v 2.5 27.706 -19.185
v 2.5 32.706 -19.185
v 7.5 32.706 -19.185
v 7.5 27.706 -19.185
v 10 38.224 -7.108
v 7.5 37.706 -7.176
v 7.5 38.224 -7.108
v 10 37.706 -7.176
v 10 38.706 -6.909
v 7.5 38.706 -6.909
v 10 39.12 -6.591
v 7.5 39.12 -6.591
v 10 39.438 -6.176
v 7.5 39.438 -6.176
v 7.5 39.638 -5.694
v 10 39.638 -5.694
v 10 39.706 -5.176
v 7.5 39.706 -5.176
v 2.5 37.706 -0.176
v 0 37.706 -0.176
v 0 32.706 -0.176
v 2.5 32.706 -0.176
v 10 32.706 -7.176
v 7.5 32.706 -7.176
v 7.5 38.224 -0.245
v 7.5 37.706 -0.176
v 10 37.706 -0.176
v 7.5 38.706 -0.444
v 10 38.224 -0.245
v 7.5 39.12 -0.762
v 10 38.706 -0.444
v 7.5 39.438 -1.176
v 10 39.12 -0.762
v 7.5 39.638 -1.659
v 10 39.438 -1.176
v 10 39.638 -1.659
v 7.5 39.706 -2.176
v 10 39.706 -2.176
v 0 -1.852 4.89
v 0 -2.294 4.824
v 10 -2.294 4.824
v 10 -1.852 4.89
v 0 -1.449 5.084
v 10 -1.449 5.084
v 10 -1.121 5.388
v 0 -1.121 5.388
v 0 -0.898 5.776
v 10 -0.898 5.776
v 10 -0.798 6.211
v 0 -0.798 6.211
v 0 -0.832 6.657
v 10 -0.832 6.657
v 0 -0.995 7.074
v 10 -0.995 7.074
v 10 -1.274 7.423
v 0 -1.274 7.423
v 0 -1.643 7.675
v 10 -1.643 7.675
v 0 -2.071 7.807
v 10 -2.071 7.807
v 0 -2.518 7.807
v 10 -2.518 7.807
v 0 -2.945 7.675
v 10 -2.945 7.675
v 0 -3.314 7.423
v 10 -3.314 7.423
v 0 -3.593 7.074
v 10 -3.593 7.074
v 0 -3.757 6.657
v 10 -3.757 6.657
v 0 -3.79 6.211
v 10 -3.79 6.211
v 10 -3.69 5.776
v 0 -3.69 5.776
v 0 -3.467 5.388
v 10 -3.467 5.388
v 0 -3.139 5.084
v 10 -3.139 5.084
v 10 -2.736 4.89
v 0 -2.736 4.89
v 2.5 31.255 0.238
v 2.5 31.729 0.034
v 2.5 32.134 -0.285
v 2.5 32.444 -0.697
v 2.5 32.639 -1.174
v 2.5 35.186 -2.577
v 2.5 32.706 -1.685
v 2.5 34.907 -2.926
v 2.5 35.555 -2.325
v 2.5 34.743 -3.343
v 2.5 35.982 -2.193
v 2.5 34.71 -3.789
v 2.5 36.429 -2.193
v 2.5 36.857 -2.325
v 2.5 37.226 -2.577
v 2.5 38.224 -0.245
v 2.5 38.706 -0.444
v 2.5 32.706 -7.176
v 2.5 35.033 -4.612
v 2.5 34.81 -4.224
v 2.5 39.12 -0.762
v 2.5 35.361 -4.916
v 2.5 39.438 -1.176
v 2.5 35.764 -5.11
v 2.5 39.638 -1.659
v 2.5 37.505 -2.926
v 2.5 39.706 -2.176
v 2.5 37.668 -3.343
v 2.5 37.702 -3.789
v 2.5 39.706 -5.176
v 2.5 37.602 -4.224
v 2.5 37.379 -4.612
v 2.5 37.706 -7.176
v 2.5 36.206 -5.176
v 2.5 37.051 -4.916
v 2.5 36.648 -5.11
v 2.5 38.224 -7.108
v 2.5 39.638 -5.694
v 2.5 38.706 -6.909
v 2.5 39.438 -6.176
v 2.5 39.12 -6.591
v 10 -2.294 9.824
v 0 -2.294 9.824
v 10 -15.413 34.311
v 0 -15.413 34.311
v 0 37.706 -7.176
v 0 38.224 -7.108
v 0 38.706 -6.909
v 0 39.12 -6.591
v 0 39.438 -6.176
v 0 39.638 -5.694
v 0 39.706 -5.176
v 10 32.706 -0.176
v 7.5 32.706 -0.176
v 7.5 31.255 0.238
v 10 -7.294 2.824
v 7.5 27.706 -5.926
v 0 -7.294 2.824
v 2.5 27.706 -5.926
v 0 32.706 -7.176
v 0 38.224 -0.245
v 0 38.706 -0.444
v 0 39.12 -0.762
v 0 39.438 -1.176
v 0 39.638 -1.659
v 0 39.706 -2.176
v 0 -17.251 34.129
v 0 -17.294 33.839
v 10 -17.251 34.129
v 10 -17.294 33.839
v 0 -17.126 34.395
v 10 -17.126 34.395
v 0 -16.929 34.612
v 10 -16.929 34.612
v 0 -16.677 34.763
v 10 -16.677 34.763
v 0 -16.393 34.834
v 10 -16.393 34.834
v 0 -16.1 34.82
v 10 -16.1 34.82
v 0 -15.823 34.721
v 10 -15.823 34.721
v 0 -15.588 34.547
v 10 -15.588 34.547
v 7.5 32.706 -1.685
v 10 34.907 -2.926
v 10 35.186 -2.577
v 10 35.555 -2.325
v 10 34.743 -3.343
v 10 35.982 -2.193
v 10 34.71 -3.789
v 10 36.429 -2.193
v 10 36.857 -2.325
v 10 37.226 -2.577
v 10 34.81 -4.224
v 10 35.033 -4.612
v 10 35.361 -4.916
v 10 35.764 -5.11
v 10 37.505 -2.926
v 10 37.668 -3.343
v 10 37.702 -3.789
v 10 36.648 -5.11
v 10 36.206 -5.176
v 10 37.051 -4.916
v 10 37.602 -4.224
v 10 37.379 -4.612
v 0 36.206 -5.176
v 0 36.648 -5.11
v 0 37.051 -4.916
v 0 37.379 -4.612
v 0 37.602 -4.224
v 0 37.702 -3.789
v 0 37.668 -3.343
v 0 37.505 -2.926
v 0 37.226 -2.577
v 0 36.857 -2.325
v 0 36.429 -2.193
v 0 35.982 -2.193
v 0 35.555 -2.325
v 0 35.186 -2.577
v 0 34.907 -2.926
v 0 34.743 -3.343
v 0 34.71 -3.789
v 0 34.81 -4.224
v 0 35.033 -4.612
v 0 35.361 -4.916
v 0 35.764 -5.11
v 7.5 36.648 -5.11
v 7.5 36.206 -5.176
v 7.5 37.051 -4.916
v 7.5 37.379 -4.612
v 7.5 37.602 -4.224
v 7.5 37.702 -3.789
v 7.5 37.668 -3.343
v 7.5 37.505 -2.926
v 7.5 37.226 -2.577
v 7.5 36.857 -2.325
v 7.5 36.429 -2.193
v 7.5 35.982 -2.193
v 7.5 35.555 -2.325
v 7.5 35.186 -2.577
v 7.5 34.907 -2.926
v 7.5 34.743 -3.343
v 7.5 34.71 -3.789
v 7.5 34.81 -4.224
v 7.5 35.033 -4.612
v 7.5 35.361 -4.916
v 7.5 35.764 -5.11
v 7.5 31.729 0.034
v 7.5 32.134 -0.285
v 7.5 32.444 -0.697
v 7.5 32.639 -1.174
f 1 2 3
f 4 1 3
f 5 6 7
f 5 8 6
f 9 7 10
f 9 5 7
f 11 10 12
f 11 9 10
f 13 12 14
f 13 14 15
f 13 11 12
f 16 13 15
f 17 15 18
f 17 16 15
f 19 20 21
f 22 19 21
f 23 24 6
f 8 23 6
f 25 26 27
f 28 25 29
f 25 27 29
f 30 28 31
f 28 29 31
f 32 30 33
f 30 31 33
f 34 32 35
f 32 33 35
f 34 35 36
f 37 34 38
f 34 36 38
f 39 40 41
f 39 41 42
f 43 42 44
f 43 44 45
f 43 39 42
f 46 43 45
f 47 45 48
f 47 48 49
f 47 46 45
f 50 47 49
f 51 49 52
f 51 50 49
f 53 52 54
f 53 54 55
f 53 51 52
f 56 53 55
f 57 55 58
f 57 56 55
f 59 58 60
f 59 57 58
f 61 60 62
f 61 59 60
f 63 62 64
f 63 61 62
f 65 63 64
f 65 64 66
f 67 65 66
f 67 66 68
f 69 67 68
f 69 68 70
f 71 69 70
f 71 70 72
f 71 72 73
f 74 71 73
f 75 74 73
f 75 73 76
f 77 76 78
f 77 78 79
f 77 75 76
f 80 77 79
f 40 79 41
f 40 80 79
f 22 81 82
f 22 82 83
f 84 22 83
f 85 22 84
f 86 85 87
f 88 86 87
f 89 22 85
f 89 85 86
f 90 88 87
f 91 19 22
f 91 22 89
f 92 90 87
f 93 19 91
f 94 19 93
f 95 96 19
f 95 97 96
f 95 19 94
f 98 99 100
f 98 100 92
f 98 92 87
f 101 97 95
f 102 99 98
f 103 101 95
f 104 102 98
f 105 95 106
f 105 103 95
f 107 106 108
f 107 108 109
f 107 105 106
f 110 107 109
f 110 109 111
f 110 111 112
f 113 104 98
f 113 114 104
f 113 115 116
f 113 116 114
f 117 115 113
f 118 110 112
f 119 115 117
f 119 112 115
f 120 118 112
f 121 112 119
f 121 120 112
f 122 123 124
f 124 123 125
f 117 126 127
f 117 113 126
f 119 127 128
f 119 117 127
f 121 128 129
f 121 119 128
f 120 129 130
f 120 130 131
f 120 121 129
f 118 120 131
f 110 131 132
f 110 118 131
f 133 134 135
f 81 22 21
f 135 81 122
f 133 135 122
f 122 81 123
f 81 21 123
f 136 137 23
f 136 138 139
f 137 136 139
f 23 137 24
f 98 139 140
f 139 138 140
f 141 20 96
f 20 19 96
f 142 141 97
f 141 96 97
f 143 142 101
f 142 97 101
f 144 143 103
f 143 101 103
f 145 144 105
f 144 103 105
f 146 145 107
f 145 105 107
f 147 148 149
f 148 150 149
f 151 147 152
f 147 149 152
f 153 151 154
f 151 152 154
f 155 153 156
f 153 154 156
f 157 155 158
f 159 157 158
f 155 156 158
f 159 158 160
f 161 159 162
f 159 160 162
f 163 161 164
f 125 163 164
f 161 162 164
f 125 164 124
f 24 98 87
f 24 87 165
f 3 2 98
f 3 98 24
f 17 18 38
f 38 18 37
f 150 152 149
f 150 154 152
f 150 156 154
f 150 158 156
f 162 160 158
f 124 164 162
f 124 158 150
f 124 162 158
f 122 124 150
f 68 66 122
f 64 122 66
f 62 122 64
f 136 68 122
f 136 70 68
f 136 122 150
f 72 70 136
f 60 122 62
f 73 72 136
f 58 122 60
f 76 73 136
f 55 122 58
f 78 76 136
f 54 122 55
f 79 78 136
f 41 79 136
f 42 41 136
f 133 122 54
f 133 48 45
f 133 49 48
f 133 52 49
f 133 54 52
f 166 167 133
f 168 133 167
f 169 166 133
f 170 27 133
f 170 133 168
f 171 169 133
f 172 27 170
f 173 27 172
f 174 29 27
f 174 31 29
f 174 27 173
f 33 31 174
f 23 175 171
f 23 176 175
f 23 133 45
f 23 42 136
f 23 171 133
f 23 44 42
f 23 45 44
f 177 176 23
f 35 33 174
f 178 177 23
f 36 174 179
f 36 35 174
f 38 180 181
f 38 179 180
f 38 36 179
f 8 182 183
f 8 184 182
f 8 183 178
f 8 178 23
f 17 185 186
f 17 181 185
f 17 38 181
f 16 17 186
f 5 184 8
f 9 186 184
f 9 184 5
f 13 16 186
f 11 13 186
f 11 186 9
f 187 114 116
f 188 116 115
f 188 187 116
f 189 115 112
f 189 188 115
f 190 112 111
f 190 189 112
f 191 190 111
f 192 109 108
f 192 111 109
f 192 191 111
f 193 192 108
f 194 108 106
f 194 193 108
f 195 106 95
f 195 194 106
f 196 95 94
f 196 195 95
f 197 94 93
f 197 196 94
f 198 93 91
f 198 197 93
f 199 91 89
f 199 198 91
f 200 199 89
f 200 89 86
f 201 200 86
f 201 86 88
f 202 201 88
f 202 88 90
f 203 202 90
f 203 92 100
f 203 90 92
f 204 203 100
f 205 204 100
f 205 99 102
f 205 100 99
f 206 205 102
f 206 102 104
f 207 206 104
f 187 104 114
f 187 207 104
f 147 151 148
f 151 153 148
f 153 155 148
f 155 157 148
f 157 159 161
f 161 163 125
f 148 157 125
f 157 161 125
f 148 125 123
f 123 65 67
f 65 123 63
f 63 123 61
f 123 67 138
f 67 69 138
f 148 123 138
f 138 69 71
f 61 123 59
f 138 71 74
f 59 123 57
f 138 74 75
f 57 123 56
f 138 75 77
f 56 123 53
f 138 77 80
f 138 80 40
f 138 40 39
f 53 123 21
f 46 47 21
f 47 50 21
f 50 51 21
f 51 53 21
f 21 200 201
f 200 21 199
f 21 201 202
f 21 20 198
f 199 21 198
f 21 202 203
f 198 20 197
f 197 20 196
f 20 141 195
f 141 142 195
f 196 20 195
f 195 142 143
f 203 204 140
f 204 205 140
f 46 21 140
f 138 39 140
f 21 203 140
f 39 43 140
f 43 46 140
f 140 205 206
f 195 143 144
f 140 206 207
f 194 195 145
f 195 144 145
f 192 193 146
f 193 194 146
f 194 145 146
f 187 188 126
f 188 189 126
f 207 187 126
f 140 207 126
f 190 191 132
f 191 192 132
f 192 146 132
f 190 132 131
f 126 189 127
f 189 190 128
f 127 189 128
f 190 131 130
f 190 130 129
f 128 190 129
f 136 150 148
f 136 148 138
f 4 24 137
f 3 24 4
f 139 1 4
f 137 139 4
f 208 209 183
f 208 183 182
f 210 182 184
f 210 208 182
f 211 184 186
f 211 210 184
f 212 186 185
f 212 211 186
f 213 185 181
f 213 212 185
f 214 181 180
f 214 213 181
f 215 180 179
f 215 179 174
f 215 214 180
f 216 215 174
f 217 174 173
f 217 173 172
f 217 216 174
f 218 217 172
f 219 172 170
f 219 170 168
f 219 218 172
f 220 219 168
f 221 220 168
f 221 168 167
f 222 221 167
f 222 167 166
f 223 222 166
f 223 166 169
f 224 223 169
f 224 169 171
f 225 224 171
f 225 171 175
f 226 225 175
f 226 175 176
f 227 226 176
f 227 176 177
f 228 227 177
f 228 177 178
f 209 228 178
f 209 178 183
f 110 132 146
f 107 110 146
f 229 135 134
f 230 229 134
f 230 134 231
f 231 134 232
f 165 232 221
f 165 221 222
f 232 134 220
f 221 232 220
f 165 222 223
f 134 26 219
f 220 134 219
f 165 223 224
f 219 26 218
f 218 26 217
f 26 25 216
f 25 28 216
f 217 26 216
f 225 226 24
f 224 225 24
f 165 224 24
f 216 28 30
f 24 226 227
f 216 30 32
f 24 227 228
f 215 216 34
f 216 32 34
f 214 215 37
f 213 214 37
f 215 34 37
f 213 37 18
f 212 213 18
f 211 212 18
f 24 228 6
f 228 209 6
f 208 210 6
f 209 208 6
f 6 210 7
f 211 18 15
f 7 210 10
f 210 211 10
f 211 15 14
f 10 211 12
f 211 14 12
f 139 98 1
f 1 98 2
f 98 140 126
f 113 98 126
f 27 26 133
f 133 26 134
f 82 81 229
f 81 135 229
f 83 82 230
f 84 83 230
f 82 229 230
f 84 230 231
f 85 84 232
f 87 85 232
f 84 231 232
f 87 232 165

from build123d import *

# Parameters (mm, degrees)
SKETCH1_R           = 1.5
BOSS_EXTRUDE1_DEPTH = 10
FILLET1_R           = 1
SKETCH2_W           = 5
SKETCH2_H           = 7
CUT_EXTRUDE1_DEPTH  = 7
FILLET3_R           = 2
CUT_EXTRUDE2_DEPTH  = 20
SKETCH4_W           = 5
SKETCH4_H           = 17.5
BOSS_EXTRUDE3_DEPTH = 5


with BuildPart() as part:
    # Sketch1 → Boss-Extrude1 (new body)
    with BuildSketch(Plane(origin=(0, 0, 0), x_dir=(0, 0, -1), z_dir=(1, 0, 0))):
        Polygon((-37.823529412, -17.294117647), (-22.823529412, -17.294117647), (-2.823529412, -7.294117647), (7.176470588, 32.705882353), (7.176470588, 39.705882353), (0.176470588, 39.705882353), (0.176470588, 32.705882353), (-9.823529412, -2.294117647), align=None)
        with Locations((3.676470588, 36.205882353)):
            Circle(SKETCH1_R, mode=Mode.SUBTRACT)
        with Locations((-6.323529412, -2.294117647)):
            Circle(SKETCH1_R, mode=Mode.SUBTRACT)
    extrude(amount=BOSS_EXTRUDE1_DEPTH)

    # Fillet1
    fillet1_edges = [part.edges().sort_by_distance(p)[0] for p in [
        (5, -17.294117647, 37.823529412),
    ]]
    fillet(fillet1_edges, radius=FILLET1_R)

    # Sketch2 → Cut-Extrude1 (cut)
    with BuildSketch(Plane(origin=(0, 39.705882353, 0), x_dir=(1, 0, 0), z_dir=(0, 1, 0))):
        with Locations((5, 3.676470588)):
            Rectangle(SKETCH2_W, SKETCH2_H)
    extrude(amount=-CUT_EXTRUDE1_DEPTH, mode=Mode.SUBTRACT)

    # Fillet3
    fillet3_edges = [part.edges().sort_by_distance(p)[0] for p in [
        (8.75, 39.705882353, -0.176470588),
        (8.75, 39.705882353, -7.176470588),
        (1.25, 39.705882353, -0.176470588),
        (1.25, 39.705882353, -7.176470588),
        (5, 32.705882353, -0.176470588),
    ]]
    fillet(fillet3_edges, radius=FILLET3_R)

    # Sketch3 → Cut-Extrude2 (cut)
    with BuildSketch(Plane(origin=(10, 0, 0), x_dir=(0, 0, -1), z_dir=(1, 0, 0))):
        Polygon((-33.839212055, -17.294117647), (-2.823529412, -7.294117647), (-22.823529412, -17.294117647), align=None)
    extrude(amount=-CUT_EXTRUDE2_DEPTH, mode=Mode.SUBTRACT)

    # Sketch4 → Boss-Extrude3 (add)
    with BuildSketch(Plane(origin=(0, 32.705882353, 0), x_dir=(1, 0, 0), z_dir=(0, 1, 0))):
        with Locations((5, 10.435073414)):
            Rectangle(SKETCH4_W, SKETCH4_H)
    extrude(amount=-BOSS_EXTRUDE3_DEPTH)


solid = part.part
